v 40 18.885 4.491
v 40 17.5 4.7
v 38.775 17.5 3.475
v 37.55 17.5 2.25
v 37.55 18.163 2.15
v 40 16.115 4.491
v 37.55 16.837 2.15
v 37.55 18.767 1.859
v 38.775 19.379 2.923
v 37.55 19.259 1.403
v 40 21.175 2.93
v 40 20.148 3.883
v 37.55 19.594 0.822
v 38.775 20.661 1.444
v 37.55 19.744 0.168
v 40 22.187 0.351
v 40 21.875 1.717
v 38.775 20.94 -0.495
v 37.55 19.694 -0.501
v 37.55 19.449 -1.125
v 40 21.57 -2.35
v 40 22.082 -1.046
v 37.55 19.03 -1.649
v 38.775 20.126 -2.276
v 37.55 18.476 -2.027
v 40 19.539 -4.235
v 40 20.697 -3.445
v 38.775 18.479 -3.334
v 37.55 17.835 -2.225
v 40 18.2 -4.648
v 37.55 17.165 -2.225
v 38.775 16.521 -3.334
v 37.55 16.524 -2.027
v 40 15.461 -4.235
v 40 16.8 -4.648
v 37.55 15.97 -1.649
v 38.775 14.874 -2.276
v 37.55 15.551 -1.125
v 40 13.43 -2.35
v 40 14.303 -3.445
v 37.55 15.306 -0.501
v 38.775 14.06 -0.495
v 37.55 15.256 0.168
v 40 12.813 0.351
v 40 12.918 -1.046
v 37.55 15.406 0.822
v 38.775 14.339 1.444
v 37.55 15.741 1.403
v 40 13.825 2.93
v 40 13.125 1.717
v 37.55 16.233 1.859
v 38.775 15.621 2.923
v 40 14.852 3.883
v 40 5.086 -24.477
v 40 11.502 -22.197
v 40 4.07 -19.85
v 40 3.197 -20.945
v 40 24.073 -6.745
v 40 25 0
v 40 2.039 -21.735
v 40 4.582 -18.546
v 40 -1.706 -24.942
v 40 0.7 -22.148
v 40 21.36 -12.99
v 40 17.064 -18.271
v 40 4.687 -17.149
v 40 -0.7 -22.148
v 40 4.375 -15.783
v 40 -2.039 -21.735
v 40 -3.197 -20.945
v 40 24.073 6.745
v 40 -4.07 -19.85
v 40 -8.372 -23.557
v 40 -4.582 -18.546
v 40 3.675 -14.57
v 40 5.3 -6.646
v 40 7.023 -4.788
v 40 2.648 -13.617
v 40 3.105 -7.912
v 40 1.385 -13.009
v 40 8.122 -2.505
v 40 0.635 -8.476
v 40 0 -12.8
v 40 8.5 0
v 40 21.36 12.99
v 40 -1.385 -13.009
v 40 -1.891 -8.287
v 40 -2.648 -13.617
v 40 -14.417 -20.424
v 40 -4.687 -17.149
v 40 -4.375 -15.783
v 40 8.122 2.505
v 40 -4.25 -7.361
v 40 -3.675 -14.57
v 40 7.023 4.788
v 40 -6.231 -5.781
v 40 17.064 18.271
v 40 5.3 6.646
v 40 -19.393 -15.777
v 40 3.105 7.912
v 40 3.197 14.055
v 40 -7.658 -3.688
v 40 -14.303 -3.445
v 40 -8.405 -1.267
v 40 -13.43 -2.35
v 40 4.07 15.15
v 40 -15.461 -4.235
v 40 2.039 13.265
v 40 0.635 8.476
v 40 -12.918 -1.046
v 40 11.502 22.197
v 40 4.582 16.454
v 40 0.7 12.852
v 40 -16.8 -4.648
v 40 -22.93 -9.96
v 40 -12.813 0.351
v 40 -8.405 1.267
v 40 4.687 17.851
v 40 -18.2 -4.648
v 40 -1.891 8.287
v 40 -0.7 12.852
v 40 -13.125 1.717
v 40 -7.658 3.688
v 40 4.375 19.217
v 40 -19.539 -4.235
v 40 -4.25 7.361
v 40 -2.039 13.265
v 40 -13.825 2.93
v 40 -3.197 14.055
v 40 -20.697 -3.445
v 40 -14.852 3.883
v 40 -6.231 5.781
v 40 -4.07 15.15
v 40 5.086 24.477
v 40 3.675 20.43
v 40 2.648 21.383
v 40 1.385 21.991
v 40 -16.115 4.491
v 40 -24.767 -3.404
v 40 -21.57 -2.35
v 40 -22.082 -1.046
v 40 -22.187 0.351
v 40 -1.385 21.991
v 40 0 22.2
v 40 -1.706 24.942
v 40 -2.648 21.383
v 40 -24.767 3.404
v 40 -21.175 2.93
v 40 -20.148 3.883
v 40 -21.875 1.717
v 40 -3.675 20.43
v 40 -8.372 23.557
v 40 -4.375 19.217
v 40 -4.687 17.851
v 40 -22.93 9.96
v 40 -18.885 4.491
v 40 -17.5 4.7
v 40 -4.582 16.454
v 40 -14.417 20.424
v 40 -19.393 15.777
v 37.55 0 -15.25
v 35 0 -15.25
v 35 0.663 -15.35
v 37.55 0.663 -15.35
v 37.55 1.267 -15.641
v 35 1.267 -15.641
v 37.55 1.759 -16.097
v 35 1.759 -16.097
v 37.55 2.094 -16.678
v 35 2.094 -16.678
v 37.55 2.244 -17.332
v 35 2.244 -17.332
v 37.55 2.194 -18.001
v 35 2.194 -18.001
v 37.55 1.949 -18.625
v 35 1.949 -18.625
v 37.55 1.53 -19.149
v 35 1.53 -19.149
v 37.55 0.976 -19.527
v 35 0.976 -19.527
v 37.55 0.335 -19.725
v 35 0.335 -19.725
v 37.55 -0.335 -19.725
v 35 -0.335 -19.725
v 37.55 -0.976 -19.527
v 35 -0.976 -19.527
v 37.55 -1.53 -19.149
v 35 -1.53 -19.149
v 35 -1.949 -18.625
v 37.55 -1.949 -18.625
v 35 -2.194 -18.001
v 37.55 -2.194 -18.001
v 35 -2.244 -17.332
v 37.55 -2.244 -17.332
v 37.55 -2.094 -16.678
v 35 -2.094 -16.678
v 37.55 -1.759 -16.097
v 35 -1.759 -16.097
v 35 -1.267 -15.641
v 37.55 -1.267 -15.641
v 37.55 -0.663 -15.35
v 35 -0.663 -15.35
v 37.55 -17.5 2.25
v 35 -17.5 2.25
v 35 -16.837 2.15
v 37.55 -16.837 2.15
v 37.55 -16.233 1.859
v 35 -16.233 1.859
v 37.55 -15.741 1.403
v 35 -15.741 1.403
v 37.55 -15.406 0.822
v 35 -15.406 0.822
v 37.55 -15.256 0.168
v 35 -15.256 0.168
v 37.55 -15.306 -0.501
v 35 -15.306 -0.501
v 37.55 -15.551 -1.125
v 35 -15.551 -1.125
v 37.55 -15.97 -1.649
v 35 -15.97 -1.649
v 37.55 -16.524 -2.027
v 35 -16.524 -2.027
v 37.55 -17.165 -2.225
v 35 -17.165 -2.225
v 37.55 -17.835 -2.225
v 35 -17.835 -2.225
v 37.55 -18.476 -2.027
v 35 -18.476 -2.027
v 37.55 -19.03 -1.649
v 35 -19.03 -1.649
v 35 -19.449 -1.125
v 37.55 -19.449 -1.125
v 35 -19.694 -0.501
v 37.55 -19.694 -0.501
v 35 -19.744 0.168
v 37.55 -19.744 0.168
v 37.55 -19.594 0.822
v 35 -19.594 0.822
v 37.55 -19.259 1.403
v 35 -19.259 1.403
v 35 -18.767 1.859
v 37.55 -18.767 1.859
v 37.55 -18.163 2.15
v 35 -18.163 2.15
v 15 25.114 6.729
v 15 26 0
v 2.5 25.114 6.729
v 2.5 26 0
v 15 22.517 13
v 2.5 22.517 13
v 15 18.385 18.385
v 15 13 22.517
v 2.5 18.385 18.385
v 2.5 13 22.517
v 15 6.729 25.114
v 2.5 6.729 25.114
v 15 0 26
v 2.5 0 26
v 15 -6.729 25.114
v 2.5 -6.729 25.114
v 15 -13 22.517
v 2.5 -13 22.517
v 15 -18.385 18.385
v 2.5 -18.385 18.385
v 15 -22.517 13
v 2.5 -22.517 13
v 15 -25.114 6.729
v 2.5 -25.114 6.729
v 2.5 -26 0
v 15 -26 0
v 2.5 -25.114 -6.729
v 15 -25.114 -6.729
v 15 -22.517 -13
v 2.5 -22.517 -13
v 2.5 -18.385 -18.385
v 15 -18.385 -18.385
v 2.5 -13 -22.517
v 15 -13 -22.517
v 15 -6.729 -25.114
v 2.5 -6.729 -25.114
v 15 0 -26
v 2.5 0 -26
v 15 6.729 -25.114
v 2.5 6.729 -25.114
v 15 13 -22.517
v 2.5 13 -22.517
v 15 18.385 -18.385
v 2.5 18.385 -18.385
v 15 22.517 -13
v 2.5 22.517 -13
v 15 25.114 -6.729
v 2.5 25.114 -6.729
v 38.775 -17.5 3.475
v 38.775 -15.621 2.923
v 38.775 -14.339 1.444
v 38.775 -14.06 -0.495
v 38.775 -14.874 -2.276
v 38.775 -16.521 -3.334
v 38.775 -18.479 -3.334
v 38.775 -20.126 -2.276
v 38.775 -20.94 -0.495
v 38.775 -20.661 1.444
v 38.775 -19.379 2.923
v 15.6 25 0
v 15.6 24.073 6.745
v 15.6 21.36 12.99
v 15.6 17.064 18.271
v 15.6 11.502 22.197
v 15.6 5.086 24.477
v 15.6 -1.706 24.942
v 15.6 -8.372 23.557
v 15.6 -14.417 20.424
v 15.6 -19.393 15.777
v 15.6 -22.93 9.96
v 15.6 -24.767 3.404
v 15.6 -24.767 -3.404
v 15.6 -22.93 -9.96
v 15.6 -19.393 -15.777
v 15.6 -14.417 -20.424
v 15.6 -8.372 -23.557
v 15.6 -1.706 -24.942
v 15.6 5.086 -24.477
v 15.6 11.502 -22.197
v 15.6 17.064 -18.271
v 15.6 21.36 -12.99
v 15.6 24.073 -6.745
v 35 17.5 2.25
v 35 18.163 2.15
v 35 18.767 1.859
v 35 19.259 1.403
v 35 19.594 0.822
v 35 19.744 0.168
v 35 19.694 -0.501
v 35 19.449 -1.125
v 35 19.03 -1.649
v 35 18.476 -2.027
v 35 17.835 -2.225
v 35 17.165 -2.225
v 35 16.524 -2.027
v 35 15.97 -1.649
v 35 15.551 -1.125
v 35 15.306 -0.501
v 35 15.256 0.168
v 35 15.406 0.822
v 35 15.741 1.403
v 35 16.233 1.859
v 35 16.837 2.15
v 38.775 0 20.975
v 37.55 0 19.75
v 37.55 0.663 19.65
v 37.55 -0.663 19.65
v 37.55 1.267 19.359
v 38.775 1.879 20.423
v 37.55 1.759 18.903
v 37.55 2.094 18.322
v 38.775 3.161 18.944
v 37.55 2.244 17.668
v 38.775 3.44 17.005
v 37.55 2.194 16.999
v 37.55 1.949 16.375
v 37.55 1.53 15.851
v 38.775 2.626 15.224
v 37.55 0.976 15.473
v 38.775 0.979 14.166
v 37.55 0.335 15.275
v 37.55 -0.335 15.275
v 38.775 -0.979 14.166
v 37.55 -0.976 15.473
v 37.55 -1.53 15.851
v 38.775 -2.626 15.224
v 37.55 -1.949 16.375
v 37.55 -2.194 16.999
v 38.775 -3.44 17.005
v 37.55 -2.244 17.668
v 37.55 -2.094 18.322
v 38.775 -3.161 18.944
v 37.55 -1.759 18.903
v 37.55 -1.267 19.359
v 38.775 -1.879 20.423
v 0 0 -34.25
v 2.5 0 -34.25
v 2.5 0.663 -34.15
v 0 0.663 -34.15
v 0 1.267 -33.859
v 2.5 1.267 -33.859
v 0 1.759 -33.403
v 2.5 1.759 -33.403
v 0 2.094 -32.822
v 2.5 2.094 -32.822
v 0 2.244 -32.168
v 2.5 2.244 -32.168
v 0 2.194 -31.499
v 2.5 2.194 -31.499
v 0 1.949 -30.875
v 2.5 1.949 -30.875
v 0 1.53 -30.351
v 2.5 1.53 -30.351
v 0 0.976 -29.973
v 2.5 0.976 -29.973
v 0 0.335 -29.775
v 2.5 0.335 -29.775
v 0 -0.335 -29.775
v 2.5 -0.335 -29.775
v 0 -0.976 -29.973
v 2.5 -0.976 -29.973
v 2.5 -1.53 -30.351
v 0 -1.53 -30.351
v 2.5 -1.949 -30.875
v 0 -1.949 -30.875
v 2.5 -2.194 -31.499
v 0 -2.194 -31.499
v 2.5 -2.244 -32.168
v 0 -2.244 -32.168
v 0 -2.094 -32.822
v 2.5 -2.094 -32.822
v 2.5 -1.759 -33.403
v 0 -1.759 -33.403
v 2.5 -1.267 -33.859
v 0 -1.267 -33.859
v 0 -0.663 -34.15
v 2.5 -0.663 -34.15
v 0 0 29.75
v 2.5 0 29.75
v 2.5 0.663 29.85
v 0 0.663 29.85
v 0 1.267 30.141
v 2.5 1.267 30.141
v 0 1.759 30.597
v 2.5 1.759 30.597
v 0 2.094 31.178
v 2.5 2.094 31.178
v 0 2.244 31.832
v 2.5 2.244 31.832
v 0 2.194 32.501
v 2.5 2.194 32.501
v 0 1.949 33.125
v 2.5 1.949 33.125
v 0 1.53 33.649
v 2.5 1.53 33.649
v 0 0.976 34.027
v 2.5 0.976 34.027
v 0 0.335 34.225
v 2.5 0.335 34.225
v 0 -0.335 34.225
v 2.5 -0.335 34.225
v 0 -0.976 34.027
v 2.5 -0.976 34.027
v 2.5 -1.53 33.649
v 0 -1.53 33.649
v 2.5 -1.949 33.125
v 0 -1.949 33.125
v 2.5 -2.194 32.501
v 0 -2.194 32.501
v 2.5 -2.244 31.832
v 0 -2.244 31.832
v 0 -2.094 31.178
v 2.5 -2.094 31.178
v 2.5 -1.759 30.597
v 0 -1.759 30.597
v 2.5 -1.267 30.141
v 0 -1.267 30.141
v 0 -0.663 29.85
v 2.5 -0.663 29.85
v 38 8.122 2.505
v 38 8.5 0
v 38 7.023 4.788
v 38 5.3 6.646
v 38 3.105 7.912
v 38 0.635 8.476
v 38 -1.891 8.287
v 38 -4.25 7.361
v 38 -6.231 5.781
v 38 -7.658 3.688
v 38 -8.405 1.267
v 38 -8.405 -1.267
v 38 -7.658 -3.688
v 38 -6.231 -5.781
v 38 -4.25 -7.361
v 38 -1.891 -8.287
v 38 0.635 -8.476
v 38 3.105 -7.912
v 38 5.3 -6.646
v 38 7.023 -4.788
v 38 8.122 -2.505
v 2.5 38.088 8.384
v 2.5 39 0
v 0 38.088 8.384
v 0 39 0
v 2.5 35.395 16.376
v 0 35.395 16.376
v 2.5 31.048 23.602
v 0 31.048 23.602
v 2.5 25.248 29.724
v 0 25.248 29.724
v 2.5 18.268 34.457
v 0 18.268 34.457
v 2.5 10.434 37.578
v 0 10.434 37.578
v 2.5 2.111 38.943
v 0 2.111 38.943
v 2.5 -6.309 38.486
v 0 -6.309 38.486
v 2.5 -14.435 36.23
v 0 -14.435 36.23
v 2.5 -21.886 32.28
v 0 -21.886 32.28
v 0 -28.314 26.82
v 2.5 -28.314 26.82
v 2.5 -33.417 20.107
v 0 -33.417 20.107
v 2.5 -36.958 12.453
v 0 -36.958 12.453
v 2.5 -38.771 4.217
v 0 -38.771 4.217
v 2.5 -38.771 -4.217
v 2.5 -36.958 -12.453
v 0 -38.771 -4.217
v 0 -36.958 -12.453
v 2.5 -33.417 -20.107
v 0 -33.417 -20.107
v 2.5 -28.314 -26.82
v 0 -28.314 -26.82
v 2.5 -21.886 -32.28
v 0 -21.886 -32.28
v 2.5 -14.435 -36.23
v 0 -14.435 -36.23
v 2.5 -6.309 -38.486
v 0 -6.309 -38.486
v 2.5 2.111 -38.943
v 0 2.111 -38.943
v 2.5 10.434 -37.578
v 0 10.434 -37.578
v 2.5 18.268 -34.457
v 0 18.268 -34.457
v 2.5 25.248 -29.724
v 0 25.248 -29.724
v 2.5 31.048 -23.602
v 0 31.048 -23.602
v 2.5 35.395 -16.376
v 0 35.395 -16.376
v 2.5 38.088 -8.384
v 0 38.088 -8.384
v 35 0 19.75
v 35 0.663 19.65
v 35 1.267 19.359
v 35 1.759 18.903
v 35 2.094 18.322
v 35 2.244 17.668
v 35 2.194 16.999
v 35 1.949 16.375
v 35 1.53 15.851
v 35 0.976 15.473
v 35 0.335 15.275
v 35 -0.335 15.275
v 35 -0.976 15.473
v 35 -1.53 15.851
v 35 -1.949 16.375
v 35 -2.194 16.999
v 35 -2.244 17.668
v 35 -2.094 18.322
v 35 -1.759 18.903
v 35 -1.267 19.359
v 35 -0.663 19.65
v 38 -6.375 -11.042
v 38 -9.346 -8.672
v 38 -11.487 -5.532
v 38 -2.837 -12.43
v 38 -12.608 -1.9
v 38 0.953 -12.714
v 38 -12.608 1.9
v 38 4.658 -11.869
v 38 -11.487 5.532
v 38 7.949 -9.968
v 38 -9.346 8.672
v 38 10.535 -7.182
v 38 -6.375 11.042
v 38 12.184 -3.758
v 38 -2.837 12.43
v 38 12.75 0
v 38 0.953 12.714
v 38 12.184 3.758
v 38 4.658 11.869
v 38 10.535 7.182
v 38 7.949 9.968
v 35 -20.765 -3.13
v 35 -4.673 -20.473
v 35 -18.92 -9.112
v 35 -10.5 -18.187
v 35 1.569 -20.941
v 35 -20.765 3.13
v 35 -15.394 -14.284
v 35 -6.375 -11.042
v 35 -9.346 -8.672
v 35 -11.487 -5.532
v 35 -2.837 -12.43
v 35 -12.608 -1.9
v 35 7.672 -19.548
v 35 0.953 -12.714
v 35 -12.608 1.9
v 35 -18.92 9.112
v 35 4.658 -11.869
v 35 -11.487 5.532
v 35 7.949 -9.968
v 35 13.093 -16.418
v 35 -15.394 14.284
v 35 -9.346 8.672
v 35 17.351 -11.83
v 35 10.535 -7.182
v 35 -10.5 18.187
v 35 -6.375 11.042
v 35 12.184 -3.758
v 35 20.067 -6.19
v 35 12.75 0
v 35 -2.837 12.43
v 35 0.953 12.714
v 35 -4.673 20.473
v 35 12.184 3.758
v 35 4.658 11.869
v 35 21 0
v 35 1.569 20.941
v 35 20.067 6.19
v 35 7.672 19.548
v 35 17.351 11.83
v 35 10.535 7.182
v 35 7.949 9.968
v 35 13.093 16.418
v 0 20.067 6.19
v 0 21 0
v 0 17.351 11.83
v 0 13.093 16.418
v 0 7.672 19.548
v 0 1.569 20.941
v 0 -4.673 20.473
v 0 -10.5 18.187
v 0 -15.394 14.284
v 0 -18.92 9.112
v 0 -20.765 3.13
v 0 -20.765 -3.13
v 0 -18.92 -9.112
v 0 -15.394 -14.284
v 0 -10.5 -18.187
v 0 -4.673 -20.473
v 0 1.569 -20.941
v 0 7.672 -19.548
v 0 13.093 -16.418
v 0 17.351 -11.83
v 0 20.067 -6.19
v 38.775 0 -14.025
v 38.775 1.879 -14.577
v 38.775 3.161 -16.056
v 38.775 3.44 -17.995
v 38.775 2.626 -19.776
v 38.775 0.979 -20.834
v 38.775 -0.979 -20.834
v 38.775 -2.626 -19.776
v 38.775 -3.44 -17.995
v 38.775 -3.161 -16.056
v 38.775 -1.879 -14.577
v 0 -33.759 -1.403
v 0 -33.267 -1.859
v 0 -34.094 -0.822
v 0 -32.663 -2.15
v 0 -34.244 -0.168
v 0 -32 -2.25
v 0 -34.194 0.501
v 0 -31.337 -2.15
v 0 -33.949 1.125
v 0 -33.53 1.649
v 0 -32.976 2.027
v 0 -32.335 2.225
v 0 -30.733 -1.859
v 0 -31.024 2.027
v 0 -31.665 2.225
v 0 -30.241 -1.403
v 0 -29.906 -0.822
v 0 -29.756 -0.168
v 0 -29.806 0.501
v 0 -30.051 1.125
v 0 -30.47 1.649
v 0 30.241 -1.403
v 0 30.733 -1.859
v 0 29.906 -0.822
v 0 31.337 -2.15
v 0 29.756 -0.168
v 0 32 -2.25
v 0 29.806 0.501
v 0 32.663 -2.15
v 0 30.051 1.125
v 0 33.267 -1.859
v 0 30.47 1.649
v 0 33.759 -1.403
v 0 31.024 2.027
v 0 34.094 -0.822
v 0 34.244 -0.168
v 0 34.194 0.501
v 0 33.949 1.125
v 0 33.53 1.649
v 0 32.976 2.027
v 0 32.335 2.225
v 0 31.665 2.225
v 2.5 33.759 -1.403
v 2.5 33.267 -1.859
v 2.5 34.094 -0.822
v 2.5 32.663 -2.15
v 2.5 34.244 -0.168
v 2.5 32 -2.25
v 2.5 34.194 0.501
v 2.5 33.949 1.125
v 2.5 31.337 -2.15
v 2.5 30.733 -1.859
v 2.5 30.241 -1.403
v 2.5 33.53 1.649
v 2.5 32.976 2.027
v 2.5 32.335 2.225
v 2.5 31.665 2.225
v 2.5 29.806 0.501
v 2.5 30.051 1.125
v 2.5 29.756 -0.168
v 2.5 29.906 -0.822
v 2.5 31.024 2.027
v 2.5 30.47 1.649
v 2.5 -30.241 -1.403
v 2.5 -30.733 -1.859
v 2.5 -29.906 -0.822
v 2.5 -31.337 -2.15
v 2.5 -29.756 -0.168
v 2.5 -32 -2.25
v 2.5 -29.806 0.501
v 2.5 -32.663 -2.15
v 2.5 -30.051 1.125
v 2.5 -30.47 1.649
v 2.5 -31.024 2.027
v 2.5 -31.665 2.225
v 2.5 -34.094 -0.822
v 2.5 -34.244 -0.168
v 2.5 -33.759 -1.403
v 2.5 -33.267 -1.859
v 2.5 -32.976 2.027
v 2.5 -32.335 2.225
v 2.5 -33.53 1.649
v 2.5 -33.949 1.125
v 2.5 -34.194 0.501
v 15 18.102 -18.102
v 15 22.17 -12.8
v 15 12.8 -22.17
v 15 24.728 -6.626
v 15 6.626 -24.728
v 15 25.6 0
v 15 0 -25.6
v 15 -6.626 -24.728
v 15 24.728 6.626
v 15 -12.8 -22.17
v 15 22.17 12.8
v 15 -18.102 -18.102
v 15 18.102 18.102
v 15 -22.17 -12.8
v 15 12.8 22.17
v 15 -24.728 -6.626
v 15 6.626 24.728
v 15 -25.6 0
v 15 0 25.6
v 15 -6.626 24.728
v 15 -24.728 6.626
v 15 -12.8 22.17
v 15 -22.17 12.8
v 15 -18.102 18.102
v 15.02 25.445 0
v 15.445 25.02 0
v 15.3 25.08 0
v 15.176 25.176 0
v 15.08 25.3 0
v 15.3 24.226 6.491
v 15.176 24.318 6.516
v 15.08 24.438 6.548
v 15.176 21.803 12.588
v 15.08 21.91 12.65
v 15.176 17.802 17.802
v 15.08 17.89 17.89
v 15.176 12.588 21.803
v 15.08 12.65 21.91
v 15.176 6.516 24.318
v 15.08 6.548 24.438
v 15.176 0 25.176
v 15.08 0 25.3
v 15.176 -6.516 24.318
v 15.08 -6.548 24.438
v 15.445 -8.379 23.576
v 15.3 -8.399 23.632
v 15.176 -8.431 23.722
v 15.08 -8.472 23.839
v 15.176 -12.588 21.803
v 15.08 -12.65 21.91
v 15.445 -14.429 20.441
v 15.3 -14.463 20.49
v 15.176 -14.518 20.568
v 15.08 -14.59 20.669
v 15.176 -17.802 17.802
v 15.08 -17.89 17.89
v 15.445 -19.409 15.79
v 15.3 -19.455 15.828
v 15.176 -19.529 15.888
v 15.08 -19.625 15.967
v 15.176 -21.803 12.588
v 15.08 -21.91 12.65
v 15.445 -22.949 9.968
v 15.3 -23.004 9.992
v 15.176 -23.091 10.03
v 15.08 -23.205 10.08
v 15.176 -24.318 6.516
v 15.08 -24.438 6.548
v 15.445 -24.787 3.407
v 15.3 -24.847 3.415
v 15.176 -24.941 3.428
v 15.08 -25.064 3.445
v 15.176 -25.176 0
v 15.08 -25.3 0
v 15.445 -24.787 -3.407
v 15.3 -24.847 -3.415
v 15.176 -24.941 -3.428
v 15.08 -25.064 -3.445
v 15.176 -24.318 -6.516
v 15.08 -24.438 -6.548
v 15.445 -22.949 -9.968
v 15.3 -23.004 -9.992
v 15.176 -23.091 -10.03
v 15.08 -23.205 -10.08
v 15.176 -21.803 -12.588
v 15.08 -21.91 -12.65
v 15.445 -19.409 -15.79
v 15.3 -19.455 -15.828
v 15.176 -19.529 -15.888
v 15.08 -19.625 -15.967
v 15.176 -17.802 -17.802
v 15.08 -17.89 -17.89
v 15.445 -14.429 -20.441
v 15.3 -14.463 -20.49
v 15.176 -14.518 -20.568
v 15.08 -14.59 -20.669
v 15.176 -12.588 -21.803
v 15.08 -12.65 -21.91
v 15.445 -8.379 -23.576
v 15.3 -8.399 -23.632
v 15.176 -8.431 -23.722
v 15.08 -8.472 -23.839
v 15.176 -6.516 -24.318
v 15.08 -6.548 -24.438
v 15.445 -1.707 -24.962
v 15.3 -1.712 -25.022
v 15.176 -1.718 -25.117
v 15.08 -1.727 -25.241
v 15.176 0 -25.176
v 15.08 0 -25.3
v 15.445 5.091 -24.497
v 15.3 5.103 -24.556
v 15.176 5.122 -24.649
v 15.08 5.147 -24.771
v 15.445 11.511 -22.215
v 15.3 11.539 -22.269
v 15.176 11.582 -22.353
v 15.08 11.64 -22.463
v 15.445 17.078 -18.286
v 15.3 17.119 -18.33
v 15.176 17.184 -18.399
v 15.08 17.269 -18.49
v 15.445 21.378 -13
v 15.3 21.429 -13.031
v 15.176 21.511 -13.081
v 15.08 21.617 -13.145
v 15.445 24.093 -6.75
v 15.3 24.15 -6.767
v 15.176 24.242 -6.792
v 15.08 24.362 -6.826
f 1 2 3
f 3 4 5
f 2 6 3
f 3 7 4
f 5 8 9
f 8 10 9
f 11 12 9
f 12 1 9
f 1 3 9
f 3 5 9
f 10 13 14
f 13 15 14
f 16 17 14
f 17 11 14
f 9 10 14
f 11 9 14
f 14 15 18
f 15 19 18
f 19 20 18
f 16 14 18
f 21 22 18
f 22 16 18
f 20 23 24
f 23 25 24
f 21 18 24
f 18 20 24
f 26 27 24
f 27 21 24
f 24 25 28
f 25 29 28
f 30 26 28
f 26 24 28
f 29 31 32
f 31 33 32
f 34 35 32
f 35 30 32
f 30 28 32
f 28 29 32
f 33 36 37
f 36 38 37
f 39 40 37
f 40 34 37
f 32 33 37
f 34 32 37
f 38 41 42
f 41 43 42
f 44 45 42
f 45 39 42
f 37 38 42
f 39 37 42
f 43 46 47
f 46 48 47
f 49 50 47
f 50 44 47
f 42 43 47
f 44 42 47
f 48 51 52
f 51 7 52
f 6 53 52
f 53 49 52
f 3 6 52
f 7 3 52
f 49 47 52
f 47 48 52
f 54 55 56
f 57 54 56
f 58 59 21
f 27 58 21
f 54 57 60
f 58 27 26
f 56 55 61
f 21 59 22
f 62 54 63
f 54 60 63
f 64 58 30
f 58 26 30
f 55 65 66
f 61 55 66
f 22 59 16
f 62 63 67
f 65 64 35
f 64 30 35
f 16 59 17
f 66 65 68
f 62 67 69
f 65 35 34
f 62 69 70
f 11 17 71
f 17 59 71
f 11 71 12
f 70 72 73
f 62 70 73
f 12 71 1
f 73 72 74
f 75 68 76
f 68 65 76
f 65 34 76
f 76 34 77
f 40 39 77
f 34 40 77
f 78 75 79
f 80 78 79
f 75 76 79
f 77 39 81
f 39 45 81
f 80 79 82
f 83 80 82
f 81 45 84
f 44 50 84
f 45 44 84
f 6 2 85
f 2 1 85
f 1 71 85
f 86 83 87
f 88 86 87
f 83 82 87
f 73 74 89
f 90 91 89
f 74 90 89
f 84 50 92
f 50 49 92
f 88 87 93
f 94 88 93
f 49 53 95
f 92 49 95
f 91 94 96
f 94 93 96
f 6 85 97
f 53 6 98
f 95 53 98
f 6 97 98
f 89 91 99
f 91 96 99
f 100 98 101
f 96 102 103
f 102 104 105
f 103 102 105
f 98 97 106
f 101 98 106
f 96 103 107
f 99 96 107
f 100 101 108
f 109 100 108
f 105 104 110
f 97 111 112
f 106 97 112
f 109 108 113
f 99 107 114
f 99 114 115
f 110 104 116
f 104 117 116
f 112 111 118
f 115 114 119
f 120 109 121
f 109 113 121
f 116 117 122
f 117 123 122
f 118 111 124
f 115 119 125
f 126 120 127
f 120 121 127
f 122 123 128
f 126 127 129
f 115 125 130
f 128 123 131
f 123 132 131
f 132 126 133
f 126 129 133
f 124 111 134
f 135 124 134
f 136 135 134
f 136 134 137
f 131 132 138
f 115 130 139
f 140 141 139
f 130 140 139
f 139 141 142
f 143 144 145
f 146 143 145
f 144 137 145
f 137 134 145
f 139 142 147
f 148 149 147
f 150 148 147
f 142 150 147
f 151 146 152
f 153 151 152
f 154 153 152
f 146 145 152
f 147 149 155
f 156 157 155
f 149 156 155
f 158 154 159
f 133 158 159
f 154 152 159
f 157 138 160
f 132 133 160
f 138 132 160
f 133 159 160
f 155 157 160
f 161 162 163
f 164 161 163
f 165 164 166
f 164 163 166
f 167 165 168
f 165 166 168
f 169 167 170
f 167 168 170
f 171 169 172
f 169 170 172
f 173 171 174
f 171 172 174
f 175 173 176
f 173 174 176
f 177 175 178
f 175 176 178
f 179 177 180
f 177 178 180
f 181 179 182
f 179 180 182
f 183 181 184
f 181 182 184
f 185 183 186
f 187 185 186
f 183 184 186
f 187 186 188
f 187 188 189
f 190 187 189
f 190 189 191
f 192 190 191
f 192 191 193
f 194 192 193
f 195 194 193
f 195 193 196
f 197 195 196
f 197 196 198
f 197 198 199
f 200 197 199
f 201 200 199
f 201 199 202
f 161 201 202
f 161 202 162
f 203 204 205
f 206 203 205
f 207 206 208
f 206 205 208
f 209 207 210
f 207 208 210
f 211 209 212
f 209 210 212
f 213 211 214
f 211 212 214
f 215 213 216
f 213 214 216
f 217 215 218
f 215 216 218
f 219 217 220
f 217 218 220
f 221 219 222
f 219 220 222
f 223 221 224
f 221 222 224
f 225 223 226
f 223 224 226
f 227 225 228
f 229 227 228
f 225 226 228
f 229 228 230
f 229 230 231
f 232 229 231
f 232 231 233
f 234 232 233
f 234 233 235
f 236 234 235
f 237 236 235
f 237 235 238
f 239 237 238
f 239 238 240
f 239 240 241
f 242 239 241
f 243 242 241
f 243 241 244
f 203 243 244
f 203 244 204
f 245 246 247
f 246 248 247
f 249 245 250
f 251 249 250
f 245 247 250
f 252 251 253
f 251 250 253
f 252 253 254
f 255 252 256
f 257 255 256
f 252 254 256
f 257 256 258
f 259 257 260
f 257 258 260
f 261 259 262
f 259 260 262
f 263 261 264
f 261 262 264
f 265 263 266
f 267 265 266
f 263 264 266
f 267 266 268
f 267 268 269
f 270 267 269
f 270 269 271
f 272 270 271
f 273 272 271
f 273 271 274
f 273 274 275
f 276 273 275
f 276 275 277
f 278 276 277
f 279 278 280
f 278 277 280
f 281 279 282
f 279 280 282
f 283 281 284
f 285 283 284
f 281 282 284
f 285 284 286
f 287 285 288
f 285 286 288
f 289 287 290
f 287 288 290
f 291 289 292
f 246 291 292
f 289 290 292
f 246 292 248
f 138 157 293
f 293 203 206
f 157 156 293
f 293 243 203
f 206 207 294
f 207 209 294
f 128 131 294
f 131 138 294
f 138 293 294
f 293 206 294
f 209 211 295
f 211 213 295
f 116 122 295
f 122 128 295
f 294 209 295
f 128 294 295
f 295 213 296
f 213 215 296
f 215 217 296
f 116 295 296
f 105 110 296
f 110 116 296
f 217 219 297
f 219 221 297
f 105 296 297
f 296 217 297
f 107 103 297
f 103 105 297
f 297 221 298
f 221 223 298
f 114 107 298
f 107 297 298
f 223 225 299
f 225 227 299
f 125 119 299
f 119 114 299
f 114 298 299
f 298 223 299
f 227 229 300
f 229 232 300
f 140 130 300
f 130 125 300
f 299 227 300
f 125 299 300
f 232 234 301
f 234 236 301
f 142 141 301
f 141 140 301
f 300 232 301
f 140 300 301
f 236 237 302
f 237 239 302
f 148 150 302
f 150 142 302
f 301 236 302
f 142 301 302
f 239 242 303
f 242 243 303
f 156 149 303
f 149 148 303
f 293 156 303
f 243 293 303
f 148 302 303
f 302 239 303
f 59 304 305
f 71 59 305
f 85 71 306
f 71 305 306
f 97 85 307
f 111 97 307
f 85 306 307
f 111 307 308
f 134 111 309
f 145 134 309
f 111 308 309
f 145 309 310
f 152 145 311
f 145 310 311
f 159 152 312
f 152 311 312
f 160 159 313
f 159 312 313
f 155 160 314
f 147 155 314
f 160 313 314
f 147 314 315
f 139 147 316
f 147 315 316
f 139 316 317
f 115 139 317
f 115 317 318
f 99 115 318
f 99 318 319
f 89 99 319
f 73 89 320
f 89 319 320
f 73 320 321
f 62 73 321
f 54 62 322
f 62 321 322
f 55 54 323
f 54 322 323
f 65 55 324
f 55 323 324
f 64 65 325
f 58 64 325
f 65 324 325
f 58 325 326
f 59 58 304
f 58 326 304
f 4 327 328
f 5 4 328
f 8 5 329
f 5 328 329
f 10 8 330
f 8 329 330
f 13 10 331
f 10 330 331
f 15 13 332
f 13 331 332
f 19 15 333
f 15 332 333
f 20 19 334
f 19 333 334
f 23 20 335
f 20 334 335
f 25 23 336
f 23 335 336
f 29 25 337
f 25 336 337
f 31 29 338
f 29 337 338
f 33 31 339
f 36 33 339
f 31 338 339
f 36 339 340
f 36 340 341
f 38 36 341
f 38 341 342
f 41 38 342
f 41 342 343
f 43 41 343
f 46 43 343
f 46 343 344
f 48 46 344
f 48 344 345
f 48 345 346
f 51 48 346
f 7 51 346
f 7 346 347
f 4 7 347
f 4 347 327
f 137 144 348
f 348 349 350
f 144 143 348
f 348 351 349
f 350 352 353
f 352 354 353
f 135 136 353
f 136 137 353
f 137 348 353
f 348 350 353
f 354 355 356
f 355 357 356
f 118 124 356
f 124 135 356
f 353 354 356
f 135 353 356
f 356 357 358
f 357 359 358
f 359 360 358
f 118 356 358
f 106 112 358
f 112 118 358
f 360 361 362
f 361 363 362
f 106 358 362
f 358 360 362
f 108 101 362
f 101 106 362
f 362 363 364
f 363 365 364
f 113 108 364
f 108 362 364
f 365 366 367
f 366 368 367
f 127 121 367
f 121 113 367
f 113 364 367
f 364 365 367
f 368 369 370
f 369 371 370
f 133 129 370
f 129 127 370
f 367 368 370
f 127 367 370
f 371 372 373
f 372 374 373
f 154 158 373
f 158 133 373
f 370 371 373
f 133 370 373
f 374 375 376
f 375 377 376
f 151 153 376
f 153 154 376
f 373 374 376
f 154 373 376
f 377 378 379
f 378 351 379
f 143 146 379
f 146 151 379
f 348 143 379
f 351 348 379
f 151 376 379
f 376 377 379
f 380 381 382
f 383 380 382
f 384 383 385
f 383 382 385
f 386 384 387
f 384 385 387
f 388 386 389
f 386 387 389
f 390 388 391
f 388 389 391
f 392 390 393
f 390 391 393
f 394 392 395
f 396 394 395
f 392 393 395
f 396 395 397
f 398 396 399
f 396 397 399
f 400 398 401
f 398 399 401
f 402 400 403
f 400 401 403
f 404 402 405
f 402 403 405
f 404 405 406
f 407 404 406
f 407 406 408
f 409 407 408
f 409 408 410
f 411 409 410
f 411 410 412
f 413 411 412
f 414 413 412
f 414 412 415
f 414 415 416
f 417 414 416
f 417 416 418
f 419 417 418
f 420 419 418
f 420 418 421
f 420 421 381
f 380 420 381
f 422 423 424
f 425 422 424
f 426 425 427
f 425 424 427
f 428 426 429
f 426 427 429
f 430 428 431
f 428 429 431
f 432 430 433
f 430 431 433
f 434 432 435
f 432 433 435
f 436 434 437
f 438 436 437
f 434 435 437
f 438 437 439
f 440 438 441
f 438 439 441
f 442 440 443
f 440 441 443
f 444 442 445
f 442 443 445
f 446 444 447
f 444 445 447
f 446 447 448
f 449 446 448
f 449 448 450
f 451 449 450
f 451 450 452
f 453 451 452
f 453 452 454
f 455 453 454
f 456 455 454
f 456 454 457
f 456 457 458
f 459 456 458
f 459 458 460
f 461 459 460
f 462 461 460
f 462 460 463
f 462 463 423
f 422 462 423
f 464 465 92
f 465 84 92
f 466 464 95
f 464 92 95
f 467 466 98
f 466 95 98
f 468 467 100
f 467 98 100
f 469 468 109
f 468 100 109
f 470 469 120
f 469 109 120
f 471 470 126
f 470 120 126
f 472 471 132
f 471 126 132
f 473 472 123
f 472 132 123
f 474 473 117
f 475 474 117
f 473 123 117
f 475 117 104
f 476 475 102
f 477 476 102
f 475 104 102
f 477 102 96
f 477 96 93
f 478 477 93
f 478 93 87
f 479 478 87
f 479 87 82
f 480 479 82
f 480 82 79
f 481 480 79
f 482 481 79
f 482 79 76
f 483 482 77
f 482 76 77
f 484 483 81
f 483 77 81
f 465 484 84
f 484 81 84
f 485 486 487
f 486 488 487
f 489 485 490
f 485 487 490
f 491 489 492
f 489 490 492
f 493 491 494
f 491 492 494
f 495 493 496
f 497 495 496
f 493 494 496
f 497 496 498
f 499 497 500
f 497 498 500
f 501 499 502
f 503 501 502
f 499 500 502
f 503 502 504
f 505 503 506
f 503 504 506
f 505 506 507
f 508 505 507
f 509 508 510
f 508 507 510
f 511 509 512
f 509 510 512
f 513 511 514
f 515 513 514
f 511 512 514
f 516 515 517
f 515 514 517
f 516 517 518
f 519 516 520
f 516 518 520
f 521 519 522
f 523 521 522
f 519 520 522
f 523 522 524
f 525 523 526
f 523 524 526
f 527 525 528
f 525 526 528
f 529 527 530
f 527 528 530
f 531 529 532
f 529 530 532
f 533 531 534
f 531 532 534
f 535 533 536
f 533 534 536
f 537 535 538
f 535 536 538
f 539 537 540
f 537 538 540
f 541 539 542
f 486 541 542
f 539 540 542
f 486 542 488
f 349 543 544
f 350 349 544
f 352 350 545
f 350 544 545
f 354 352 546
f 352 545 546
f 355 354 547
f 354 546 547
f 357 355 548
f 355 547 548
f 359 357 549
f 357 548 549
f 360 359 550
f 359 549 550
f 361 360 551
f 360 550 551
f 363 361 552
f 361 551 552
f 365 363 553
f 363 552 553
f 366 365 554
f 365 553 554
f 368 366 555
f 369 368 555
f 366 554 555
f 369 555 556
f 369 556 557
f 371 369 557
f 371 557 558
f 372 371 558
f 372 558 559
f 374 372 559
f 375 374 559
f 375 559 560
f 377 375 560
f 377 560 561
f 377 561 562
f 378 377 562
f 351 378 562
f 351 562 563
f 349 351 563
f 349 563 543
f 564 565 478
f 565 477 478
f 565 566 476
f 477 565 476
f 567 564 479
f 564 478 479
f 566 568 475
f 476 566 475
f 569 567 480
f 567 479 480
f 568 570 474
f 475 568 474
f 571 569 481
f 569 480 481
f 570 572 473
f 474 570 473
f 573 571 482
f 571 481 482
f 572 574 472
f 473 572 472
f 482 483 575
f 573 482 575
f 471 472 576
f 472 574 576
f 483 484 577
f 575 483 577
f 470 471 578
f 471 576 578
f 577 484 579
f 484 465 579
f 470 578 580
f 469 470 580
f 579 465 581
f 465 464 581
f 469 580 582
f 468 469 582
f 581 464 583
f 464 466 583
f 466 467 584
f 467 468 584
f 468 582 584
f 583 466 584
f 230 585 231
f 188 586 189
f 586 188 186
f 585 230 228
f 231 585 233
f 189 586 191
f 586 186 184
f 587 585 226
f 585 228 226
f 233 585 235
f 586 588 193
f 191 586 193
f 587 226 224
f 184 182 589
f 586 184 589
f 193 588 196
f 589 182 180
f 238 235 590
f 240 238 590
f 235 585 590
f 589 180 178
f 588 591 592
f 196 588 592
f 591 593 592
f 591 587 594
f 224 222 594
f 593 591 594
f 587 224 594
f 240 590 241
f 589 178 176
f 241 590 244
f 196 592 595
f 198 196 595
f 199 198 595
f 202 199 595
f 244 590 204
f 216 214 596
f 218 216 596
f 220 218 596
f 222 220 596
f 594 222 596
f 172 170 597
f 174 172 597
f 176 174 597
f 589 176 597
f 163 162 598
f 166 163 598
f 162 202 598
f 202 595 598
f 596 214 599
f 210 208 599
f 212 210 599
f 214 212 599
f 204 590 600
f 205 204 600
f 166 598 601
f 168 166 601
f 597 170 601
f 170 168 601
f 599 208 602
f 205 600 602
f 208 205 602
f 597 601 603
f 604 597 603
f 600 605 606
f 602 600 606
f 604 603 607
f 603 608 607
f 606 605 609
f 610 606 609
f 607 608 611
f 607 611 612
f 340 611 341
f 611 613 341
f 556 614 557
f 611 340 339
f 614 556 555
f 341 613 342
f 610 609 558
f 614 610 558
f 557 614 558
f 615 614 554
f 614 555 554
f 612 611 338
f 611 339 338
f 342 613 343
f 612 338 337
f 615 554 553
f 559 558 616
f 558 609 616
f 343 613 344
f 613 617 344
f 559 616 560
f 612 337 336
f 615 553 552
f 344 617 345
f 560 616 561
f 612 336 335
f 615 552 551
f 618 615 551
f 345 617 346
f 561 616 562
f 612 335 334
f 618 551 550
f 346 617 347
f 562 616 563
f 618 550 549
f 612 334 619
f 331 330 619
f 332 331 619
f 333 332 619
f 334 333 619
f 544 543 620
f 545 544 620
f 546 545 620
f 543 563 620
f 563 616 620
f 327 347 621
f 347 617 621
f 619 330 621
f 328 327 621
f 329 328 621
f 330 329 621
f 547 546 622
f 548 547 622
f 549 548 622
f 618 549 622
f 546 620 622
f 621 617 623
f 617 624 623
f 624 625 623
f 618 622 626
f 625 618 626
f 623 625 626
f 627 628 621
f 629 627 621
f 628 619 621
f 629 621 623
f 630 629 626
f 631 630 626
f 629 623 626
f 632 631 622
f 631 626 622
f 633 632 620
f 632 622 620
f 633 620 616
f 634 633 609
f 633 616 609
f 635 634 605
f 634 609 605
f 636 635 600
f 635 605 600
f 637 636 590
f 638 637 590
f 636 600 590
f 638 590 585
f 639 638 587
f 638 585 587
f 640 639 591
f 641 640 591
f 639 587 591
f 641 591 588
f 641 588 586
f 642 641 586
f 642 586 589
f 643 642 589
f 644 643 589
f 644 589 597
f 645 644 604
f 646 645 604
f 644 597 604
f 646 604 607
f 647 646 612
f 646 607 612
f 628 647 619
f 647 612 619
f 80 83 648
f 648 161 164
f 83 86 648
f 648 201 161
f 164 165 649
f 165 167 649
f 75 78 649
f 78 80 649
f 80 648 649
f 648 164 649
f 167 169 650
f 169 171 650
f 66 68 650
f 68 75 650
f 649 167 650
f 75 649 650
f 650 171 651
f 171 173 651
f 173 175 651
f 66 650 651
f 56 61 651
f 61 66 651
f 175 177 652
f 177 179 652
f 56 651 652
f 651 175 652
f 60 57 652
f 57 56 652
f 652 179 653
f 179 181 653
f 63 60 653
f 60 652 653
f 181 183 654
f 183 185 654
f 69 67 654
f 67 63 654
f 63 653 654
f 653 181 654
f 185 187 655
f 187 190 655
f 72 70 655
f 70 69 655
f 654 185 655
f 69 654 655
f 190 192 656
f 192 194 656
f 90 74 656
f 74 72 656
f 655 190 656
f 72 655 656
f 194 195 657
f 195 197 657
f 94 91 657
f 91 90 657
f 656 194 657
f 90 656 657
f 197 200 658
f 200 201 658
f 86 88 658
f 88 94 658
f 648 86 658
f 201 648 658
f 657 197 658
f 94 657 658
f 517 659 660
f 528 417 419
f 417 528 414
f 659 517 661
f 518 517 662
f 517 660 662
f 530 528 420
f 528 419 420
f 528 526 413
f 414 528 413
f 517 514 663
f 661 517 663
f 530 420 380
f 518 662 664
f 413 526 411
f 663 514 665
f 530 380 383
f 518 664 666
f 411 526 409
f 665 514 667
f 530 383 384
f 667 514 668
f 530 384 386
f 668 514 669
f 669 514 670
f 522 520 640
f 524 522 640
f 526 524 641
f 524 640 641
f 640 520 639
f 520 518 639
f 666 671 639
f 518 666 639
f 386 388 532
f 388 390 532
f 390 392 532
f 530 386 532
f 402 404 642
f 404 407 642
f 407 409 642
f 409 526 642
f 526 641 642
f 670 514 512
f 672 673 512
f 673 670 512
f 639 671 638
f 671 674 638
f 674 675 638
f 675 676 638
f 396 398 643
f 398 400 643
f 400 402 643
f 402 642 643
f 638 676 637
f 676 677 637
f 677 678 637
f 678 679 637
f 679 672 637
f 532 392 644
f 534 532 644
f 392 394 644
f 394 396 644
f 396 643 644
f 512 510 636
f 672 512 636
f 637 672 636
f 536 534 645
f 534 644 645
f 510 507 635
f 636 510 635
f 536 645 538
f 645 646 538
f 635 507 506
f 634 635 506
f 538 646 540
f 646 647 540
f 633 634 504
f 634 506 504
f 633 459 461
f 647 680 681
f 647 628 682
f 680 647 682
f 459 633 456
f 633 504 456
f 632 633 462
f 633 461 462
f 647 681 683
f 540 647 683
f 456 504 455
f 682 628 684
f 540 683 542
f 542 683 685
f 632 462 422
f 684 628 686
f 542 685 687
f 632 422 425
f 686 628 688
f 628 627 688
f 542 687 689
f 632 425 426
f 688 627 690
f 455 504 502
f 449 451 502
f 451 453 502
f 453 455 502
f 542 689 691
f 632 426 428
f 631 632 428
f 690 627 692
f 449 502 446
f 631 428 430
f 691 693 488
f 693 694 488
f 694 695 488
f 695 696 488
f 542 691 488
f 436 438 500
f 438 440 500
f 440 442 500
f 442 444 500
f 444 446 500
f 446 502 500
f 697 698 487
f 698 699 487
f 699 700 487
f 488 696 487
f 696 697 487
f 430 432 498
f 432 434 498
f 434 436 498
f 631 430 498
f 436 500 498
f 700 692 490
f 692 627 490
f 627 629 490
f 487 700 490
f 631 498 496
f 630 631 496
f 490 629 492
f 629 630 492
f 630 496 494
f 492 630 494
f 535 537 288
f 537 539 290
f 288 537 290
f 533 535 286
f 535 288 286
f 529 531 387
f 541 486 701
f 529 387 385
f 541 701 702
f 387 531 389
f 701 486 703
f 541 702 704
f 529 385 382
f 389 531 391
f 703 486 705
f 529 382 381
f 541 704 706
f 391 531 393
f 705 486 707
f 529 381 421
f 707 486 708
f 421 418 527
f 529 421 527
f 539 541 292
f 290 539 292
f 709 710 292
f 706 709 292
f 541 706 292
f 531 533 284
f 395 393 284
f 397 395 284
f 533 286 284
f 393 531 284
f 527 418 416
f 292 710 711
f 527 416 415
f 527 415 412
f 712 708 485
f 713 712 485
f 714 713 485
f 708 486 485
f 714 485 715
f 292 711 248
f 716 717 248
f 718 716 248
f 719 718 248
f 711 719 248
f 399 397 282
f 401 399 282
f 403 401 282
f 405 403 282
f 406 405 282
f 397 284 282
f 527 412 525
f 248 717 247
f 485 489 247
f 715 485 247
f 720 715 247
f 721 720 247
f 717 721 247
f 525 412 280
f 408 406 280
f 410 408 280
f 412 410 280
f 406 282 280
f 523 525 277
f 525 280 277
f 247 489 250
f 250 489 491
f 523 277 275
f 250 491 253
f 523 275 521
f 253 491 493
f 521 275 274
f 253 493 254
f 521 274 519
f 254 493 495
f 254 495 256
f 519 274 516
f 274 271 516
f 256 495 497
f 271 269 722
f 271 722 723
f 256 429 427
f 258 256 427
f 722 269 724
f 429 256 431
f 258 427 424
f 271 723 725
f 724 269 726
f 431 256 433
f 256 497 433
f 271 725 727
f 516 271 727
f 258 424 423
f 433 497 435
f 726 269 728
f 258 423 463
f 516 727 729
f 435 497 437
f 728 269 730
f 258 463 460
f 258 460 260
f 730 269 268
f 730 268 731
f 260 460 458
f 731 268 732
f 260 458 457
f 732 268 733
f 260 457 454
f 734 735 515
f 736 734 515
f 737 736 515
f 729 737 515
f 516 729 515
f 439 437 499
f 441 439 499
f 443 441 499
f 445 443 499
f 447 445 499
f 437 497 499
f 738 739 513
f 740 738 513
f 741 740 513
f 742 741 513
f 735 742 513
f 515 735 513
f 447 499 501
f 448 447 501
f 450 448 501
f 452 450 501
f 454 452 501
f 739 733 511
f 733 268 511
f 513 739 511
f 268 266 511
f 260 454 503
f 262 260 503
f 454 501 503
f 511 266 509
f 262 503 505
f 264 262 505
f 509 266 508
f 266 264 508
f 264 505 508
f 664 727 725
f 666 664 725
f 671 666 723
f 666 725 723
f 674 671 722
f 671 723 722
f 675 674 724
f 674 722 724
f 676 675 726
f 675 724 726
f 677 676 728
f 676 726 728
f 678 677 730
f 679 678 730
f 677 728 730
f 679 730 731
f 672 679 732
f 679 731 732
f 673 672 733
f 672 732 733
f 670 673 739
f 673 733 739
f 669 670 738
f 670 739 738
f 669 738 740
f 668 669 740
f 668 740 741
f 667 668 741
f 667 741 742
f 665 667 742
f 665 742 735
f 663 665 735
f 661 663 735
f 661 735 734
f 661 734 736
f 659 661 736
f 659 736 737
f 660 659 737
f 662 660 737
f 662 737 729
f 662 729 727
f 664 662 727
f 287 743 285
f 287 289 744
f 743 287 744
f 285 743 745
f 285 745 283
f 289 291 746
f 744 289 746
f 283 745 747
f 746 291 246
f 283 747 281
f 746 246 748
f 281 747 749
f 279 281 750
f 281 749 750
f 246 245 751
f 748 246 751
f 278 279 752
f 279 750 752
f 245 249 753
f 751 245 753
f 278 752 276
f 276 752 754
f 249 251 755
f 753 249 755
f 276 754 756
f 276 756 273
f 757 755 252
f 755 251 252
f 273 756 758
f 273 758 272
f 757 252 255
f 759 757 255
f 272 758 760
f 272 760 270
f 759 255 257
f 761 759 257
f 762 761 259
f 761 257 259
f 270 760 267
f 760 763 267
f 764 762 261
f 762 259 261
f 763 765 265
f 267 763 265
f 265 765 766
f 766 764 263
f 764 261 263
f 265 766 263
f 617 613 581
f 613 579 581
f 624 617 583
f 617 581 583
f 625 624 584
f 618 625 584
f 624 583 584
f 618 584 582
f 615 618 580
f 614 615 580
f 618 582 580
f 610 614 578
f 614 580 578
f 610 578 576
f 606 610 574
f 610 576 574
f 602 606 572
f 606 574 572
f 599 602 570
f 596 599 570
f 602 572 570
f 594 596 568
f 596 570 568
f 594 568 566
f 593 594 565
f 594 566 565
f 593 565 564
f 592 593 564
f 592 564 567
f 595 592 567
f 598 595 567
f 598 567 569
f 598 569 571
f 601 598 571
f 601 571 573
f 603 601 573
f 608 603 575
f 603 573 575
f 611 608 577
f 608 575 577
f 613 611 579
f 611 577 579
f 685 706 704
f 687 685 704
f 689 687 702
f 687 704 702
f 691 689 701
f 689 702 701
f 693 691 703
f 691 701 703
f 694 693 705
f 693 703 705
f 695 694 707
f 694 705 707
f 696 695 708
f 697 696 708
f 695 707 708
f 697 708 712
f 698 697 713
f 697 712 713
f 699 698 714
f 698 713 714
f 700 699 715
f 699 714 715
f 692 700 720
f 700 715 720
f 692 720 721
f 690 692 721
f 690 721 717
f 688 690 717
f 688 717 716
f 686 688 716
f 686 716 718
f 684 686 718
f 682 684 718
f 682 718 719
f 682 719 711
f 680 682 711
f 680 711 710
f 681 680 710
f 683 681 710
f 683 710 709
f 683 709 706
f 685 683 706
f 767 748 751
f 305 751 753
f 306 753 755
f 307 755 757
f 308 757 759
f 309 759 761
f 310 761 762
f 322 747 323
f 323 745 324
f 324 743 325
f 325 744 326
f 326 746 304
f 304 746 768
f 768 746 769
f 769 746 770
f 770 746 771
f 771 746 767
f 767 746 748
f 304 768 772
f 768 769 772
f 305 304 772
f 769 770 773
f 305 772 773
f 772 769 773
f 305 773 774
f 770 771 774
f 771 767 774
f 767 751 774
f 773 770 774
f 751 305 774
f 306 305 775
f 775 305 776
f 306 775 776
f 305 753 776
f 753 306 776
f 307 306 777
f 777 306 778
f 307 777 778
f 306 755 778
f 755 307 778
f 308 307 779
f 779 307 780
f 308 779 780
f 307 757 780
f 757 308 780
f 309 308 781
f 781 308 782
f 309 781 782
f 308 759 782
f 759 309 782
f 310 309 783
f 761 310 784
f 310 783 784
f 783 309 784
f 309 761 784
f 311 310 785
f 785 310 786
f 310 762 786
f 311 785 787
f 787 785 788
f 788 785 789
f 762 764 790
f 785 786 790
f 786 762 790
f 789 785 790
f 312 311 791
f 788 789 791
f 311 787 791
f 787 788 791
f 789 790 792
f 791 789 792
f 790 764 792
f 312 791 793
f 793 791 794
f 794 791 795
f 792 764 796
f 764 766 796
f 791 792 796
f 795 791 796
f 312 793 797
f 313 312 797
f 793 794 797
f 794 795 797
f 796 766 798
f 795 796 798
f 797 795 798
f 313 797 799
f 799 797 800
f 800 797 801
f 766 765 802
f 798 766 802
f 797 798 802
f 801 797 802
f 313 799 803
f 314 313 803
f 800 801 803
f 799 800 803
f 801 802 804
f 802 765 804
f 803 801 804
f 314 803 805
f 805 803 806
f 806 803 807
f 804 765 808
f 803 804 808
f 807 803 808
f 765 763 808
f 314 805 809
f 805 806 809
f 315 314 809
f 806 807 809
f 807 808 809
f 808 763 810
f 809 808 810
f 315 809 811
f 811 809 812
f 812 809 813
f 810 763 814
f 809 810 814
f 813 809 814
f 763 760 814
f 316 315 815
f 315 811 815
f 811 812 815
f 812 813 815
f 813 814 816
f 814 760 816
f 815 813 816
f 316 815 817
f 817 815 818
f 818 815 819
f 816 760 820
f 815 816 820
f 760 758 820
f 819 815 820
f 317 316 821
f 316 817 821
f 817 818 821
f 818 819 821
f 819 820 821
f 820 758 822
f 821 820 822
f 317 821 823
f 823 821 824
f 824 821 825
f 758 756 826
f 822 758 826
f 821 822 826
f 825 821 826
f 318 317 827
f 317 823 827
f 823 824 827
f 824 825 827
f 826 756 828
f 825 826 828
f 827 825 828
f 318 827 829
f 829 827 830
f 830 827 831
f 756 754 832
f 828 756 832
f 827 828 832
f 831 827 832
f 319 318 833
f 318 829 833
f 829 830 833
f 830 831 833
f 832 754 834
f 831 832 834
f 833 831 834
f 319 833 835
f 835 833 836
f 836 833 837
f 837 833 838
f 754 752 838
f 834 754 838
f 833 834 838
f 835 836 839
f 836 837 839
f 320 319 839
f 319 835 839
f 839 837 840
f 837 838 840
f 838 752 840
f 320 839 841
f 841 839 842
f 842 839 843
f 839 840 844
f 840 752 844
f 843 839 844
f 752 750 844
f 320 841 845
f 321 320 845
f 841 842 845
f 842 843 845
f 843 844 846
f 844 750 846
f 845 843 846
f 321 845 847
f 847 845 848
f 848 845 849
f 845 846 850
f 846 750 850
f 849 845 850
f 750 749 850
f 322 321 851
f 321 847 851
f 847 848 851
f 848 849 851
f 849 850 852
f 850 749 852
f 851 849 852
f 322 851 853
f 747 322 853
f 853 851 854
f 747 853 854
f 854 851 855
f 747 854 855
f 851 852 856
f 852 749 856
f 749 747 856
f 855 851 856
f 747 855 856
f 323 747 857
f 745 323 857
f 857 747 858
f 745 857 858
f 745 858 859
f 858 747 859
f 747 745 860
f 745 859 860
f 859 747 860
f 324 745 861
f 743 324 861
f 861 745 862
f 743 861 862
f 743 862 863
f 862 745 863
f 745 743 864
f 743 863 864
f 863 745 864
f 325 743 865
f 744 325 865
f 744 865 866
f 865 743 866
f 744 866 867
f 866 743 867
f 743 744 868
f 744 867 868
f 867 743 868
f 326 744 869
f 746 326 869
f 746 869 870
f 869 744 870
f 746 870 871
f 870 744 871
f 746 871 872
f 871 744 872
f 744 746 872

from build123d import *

# Parameters (mm, degrees)
CSK_FOR_M4_FLAT_HEAD_MACHINE_SCREW1_D           = 4.5
CSK_FOR_M4_FLAT_HEAD_MACHINE_SCREW1_DEPTH       = 5
CSK_FOR_M4_FLAT_HEAD_MACHINE_SCREW1_CSINK_D     = 9.4
CSK_FOR_M4_FLAT_HEAD_MACHINE_SCREW1_CSINK_ANGLE = 90
FILLET1_R                                       = 0.6
M4_CLEARANCE_HOLE1_D                            = 4.5
M4_CLEARANCE_HOLE1_DEPTH                        = 2.5


with BuildPart() as part:
    # Sketch2 → Revolve1 (revolve)
    with BuildSketch(Plane.XY):
        Polygon((0, 21), (35, 21), (35, 12.75), (38, 12.75), (38, 8.5), (40, 8.5), (40, 25), (15, 25), (15, 26), (2.5, 26), (2.5, 39), (0, 39), (0, 26), align=None)
    revolve(axis=Axis((-64.103352454, 0, 0), (1, 0, 0)))

    # CSK for M4 Flat Head Machine Screw1
    with Locations(Plane(origin=(40, 0, 0), x_dir=(0, 0, -1), z_dir=(1, 0, 0))):
        with Locations((0, 17.5), (17.5, 0), (0, -17.5), (-17.5, 0)):
            CounterSinkHole(CSK_FOR_M4_FLAT_HEAD_MACHINE_SCREW1_D / 2, CSK_FOR_M4_FLAT_HEAD_MACHINE_SCREW1_CSINK_D / 2, depth=CSK_FOR_M4_FLAT_HEAD_MACHINE_SCREW1_DEPTH, counter_sink_angle=CSK_FOR_M4_FLAT_HEAD_MACHINE_SCREW1_CSINK_ANGLE)

    # Fillet1
    fillet1_edges = [part.edges().sort_by_distance(p)[0] for p in [
        (15, -25, 0),
    ]]
    fillet(fillet1_edges, radius=FILLET1_R)

    # M4 Clearance Hole1
    with Locations(Plane.ZY):
        with Locations((0, 32), (0, -32), (32, 0), (-32, 0)):
            Hole(M4_CLEARANCE_HOLE1_D / 2, depth=M4_CLEARANCE_HOLE1_DEPTH)


solid = part.part
